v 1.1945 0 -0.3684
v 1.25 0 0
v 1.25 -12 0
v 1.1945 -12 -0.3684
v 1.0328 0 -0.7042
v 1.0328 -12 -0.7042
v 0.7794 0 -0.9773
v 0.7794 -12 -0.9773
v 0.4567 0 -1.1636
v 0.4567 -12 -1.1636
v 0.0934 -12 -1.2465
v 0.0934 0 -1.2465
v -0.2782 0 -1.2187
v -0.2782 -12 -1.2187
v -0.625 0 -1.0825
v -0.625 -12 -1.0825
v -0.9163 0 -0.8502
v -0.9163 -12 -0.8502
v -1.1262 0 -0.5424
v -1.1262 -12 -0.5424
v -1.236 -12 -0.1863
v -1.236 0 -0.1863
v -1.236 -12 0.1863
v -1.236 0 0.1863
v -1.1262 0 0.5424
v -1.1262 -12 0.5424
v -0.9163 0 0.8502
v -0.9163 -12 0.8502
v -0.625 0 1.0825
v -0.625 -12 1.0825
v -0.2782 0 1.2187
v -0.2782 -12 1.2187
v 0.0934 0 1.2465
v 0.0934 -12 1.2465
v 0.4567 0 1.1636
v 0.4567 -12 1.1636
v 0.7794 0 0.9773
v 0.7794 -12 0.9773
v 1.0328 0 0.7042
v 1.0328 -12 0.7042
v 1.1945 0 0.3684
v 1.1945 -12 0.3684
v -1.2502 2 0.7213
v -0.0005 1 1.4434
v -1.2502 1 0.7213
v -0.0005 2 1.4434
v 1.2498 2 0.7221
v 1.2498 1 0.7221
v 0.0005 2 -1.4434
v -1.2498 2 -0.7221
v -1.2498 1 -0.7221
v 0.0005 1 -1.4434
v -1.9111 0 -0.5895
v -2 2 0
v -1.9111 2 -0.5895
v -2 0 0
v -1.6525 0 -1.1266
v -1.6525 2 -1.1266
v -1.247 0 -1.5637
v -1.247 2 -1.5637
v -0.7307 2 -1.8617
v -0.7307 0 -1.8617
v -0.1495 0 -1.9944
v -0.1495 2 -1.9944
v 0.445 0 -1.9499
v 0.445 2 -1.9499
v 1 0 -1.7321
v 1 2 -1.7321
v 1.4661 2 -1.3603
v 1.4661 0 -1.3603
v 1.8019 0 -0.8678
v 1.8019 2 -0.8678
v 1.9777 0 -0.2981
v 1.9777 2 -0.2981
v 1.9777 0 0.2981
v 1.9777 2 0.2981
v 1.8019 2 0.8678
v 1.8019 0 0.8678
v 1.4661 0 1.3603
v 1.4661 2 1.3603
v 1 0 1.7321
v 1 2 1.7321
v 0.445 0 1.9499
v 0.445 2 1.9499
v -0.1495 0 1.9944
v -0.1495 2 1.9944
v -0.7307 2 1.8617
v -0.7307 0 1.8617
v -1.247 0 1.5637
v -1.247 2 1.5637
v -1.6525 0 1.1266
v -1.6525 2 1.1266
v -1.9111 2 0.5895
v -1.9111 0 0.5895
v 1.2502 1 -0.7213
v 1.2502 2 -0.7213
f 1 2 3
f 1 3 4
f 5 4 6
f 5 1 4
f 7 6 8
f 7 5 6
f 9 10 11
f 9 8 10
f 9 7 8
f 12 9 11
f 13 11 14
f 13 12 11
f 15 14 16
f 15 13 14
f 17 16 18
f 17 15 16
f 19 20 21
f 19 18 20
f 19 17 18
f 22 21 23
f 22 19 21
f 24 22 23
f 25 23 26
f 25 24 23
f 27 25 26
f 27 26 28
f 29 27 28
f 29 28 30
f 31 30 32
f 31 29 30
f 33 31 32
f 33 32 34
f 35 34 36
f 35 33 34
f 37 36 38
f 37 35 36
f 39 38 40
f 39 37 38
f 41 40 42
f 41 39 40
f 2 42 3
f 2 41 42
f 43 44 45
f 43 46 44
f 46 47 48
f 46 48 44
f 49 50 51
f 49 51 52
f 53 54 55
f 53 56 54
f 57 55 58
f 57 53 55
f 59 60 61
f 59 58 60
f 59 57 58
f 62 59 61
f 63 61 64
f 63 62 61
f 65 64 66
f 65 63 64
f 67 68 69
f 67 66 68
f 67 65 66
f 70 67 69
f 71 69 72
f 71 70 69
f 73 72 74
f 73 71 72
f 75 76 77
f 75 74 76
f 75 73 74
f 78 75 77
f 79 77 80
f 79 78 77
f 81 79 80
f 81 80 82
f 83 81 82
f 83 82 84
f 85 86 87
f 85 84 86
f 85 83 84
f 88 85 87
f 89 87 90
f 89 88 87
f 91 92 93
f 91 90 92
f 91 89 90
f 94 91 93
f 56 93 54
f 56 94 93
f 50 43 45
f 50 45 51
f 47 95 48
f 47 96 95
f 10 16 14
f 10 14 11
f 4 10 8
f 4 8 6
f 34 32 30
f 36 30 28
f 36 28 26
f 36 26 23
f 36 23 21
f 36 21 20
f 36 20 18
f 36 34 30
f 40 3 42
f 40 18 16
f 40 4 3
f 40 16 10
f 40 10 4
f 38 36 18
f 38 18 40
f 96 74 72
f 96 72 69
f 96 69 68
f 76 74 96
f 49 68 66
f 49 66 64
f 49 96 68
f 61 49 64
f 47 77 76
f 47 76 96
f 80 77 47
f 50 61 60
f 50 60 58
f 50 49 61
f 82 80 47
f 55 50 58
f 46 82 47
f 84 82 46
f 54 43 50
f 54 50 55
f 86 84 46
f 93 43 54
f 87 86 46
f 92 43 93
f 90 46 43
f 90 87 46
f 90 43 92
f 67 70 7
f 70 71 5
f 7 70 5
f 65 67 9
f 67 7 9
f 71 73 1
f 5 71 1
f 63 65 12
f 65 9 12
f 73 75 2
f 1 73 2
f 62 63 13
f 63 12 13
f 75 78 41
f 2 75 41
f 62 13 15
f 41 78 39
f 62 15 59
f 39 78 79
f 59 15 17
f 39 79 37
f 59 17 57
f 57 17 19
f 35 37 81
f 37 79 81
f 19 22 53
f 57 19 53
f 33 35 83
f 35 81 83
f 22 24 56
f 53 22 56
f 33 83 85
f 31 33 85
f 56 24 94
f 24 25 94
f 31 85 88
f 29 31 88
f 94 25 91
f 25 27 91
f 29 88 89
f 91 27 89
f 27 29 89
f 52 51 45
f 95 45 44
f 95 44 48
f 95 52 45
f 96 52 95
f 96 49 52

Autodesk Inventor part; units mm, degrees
ref_plane "YZ Plane" through (0, 0, 0) normal (1, 0, 0) x (0, 1, 0)
ref_plane "XZ Plane" through (0, 0, 0) normal (0, 1, 0) x (-1, 0, 0)
ref_plane "XY Plane" through (0, 0, 0) normal (0, 0, 1) x (1, 0, 0)
sketch "Sketch1" plane through (0, 0, 0) normal (0, 1, 0) x (-1, 0, 0)
  circle A0 centre (0, 0) radius 2
  dimension "d0" = 4
extrude "Extrusion1" add sketch "Sketch1" along normal blind 2
sketch "Sketch2" plane through (0, 0, 0) normal (0, -1, 0) x (1, 0, 0)
  circle A0 centre (0, 0) radius 1.25
  dimension "d3" = 2.5
extrude "Extrusion2" add sketch "Sketch2" along normal blind 12
thread "Thread1" size "M2.5x0.45" class "6g" standard "ANSI Metric M Profile" full length
sketch "Sketch3" plane through (0, 2, 0) normal (0, 1, 0) x (1, 0, 0)
  circle A0 centre (0, 0) radius 1.25 projected
  line L0 (0.0005, 1.4434) -> (1.2502, 0.7213)
  line L1 (1.2502, 0.7213) -> (1.2498, -0.7221)
  line L2 (1.2498, -0.7221) -> (-0.0005, -1.4434)
  line L3 (-0.0005, -1.4434) -> (-1.2502, -0.7213)
  line L4 (-1.2502, -0.7213) -> (-1.2498, 0.7221)
  line L5 (-1.2498, 0.7221) -> (0.0005, 1.4434)
  point P0 (-0.6247, 1.0827)
extrude "Extrusion3" cut sketch "Sketch3" against normal blind 1
properties part number "screwM2-5"
